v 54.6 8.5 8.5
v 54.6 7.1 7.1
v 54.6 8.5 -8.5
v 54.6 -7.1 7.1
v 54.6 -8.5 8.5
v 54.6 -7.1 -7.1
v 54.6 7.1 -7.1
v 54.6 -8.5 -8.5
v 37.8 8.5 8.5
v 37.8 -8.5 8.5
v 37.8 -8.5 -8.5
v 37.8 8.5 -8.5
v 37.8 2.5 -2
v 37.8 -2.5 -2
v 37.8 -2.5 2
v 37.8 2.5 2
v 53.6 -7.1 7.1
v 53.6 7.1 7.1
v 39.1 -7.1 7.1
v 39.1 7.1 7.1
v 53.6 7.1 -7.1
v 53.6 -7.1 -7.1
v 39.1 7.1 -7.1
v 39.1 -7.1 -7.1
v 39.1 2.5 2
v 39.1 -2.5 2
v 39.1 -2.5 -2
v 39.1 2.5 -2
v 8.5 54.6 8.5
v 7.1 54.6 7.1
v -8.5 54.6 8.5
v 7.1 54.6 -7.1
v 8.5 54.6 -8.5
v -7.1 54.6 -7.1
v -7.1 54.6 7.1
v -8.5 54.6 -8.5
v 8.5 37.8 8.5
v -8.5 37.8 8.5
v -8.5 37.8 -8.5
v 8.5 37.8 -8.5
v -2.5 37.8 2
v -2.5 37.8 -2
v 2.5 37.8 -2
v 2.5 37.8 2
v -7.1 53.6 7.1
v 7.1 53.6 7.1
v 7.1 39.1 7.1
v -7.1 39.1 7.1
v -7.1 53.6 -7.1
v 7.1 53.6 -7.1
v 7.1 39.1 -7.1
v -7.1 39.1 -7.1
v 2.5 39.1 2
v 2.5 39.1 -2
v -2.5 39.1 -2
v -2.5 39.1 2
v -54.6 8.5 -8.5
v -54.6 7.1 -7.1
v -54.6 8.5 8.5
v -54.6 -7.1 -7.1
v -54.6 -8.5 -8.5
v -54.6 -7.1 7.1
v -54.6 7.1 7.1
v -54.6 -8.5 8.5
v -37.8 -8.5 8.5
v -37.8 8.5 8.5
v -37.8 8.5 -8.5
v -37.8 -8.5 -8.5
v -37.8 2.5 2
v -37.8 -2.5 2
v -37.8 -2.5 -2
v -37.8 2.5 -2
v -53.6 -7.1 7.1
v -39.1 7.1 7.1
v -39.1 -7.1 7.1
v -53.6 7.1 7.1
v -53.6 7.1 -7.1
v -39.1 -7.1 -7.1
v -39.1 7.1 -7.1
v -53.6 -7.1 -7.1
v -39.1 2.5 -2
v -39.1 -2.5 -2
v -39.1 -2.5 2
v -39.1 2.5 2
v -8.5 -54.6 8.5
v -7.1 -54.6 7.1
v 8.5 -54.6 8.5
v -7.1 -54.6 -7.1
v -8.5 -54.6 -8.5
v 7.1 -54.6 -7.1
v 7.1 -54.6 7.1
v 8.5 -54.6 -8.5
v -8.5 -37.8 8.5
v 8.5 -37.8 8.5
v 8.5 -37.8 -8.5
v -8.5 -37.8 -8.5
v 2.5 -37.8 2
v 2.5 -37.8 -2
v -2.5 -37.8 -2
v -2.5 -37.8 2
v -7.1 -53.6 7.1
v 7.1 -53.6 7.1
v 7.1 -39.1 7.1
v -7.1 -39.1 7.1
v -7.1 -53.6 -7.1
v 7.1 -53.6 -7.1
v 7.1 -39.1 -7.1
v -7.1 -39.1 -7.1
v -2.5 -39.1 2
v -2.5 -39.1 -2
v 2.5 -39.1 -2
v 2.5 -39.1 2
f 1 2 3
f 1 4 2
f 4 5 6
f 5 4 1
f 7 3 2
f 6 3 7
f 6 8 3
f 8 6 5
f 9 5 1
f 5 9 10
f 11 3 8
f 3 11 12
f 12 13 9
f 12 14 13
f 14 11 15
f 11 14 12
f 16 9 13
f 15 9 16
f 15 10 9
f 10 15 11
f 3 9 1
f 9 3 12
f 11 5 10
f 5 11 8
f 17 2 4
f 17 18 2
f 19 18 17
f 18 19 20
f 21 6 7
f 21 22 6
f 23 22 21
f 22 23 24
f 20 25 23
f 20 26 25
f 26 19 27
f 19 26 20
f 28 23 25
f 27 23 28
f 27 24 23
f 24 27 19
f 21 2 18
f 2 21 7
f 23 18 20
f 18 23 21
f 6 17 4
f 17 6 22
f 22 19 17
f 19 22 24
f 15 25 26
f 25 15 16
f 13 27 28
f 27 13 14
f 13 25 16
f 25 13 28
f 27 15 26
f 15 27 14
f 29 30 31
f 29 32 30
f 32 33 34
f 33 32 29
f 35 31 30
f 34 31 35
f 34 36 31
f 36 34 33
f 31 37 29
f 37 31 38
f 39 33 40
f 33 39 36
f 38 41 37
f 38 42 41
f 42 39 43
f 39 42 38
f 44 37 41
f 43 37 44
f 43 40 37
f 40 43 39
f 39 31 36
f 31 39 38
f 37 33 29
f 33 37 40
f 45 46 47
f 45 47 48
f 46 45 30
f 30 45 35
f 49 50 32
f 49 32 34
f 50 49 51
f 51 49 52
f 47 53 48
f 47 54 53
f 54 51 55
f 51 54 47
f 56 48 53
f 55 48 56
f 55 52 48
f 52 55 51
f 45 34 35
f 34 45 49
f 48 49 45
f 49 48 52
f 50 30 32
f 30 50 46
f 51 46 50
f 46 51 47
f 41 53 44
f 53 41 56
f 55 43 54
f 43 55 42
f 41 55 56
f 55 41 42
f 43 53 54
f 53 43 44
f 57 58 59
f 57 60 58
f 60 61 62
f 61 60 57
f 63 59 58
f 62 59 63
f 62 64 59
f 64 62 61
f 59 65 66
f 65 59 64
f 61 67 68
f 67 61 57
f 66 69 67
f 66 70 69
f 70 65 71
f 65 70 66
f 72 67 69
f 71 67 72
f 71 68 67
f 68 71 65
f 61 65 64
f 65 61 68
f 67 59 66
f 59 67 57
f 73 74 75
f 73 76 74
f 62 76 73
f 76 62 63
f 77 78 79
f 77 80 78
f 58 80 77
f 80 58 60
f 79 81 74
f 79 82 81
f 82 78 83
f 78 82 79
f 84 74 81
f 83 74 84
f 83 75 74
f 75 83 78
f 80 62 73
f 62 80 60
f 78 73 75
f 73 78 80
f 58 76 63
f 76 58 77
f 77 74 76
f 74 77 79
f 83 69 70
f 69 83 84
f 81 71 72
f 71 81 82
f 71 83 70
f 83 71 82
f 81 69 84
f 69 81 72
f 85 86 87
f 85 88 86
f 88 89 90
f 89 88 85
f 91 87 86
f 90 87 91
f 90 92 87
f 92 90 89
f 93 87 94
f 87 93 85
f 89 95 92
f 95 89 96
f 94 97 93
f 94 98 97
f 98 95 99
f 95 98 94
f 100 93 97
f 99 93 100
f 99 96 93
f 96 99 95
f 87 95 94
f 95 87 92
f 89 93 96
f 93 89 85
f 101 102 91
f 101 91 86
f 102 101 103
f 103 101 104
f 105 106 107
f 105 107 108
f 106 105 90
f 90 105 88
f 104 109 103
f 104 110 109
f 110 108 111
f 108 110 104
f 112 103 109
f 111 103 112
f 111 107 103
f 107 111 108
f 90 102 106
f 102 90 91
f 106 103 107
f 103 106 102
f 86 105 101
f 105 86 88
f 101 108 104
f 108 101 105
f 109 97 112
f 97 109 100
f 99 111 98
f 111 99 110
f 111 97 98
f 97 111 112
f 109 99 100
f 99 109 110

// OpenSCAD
// file: 02_materials_tolerances.scad
/*
================================================================
AIDRONE - FILE 02 / 24
MATERIALS + MANUFACTURING + TOLERANCE AUTHORITY

This file intentionally does NOT redefine CAMERA_BODY_* or
CAMERA_POCKET_* from 00_master_parameters.scad. OpenSCAD uses a
single variable namespace across include() expansion; the previous
duplicate names caused the CAMERA_SIDE_CLEARANCE evaluation warnings.
================================================================
*/
$fn=100;

PROCESS_FDM=1;
MANUFACTURING_PROCESS=PROCESS_FDM;
NOZZLE_D=0.40;
LAYER_HEIGHT=0.20;
EXTRUSION_WIDTH=0.45;

WALL_LIGHT=3*EXTRUSION_WIDTH;
WALL_STANDARD=4*EXTRUSION_WIDTH;
WALL_STRUCTURAL=5*EXTRUSION_WIDTH;
WALL_HEAVY=6*EXTRUSION_WIDTH;
DUCT_WALL_NOMINAL=2.00;
MIN_CRASH_MEMBER=2.00;
PREFERRED_CRASH_MEMBER=2.40;
MIN_PRINT_FEATURE=0.80;

CLEARANCE_CLOSE=0.10;
CLEARANCE_REMOVABLE=0.15;
CLEARANCE_SLIDING=0.20;
CLEARANCE_MOVING=0.35;
CLEARANCE_SERVICE=0.40;

function female_bore_for_male(male_diameter,radial_clearance)=male_diameter+2*radial_clearance;
function male_for_female_bore(female_diameter,radial_clearance)=female_diameter-2*radial_clearance;
function pocket_dimension(part_dimension,side_clearance)=part_dimension+2*side_clearance;

CORE_OD=74.0;
CORE_COLLAR_RADIAL_CLEARANCE=CLEARANCE_SLIDING;
COLLAR_BORE=female_bore_for_male(CORE_OD,CORE_COLLAR_RADIAL_CLEARANCE);

// Manufacturing fit policy for camera cavities.  Names are prefixed TOL_
// so they cannot collide with the geometry authority in File 00.
TOL_CAMERA_BODY_X=14.0;
TOL_CAMERA_BODY_Y=14.0;
TOL_CAMERA_BODY_Z=14.0;
TOL_CAMERA_SIDE_CLEARANCE=0.15;
TOL_CAMERA_POCKET_X=TOL_CAMERA_BODY_X+2*TOL_CAMERA_SIDE_CLEARANCE;
TOL_CAMERA_POCKET_Y=TOL_CAMERA_BODY_Y+2*TOL_CAMERA_SIDE_CLEARANCE;
TOL_CAMERA_POCKET_Z=TOL_CAMERA_BODY_Z+2*TOL_CAMERA_SIDE_CLEARANCE;

KEY_SIDE_CLEARANCE=CLEARANCE_SLIDING;
function keyway_width(key_width)=key_width+2*KEY_SIDE_CLEARANCE;
function keyway_depth(key_projection)=key_projection+CLEARANCE_SLIDING;
PIVOT_RADIAL_CLEARANCE=CLEARANCE_MOVING;
function pivot_bore(shaft_diameter)=shaft_diameter+2*PIVOT_RADIAL_CLEARANCE;
METAL_PIN_RADIAL_CLEARANCE=0.10;
function metal_pin_bore(pin_diameter)=pin_diameter+2*METAL_PIN_RADIAL_CLEARANCE;

M1_6_NOMINAL=1.60; M2_NOMINAL=2.00; M2_5_NOMINAL=2.50;
M1_6_CLEARANCE_HOLE=1.90; M2_CLEARANCE_HOLE=2.40; M2_5_CLEARANCE_HOLE=2.90;
SCREW_EDGE_FACTOR=2.0;
function minimum_screw_edge_distance(screw_nominal_d)=screw_nominal_d*SCREW_EDGE_FACTOR;
BOSS_WALL_MIN=1.60;
function boss_outer_diameter(hole_diameter)=hole_diameter+2*BOSS_WALL_MIN;

INSERT_SELECTED=false; INSERT_OD=0; INSERT_LENGTH=0; INSERT_HOLE_D=0;
MIN_STRUCTURAL_FILLET=1.0; PREFERRED_STRUCTURAL_FILLET=1.5;
WIRE_CHANNEL_SIDE_CLEARANCE=0.50;
function wire_channel_width(wire_bundle_width)=wire_bundle_width+2*WIRE_CHANNEL_SIDE_CLEARANCE;
WIRE_MIN_BEND_RADIUS_FACTOR=3.0;
function wire_min_bend_radius(cable_diameter)=cable_diameter*WIRE_MIN_BEND_RADIUS_FACTOR;
BATTERY_SIDE_CLEARANCE=0.50;
function battery_pocket_dimension(battery_dimension)=battery_dimension+2*BATTERY_SIDE_CLEARANCE;
BATTERY_MIN_PADDING=1.0;
MOTOR_SUPPORT_MIN_THICKNESS=2.40;
MOTOR_SUPPORT_PREFERRED_THICKNESS=3.00;
MIN_ROTOR_STATIC_RADIAL_CLEARANCE=1.00;
VANE_SWEEP_MIN_CLEARANCE=1.00;
CAMERA_FOV_MARGIN_DEG=3.0;

XY_EXTERNAL_COMPENSATION=0.00;
XY_INTERNAL_COMPENSATION=0.00;
Z_COMPENSATION=0.00;
function compensated_external(dimension)=dimension+XY_EXTERNAL_COMPENSATION;
function compensated_internal(dimension)=dimension+XY_INTERNAL_COMPENSATION;

assert(NOZZLE_D>0,"Nozzle diameter must be positive.");
assert(WALL_STANDARD>=3*NOZZLE_D,"Standard wall unexpectedly thin.");
assert(MIN_CRASH_MEMBER>=2.0,"Crash member below structural study minimum.");
assert(CLEARANCE_MOVING>CLEARANCE_SLIDING,"Moving fit must be looser than sliding fit.");
assert(CLEARANCE_SLIDING>CLEARANCE_CLOSE,"Sliding fit must be looser than close fit.");
assert(abs(COLLAR_BORE-74.4)<0.0001,"Core/collar interface changed unexpectedly.");
assert(abs(TOL_CAMERA_POCKET_X-14.3)<0.0001 && abs(TOL_CAMERA_POCKET_Y-14.3)<0.0001 && abs(TOL_CAMERA_POCKET_Z-14.3)<0.0001,"Camera manufacturing pocket policy changed unexpectedly.");
assert(MIN_ROTOR_STATIC_RADIAL_CLEARANCE>=1.0,"Rotor manufacturing clearance below current safety floor.");

echo("============================================");
echo("AIDRONE MATERIAL / TOLERANCE AUTHORITY");
echo("Nozzle diameter =",NOZZLE_D);
echo("Layer height =",LAYER_HEIGHT);
echo("Light wall =",WALL_LIGHT);
echo("Standard wall =",WALL_STANDARD);
echo("Structural wall =",WALL_STRUCTURAL);
echo("Preferred crash member =",PREFERRED_CRASH_MEMBER);
echo("Sliding radial clearance =",CLEARANCE_SLIDING);
echo("Core OD =",CORE_OD);
echo("Collar bore =",COLLAR_BORE);
echo("Tolerance camera pocket X =",TOL_CAMERA_POCKET_X);
echo("Tolerance camera pocket Y =",TOL_CAMERA_POCKET_Y);
echo("Tolerance camera pocket Z =",TOL_CAMERA_POCKET_Z);
echo("M2 printed clearance hole =",M2_CLEARANCE_HOLE);
echo("Minimum motor support thickness =",MOTOR_SUPPORT_MIN_THICKNESS);
echo("Minimum rotor radial clearance =",MIN_ROTOR_STATIC_RADIAL_CLEARANCE);
echo("============================================");
// main file
/* BUDDY FILE 20 - FOUR-CAMERA PERCEPTION RING */
include <00_master_parameters.scad>
include <02_materials_tolerances.scad>
$fn=100;
VEHICLE_D=115; VEHICLE_R=57.5; SHELL_INNER_D=111; SHELL_INNER_R=55.5;
DUCT_OD_LOCAL=74; DUCT_R=37; AIRWAY_D=70; AIRWAY_R=35;
CAMERA_COUNT_LOCAL=4; CAMERA_ANGLE_OFFSET=0;
CAMERA_BODY_W=14; CAMERA_BODY_H=14; CAMERA_BODY_D=15;
CAMERA_POCKET_W=14.2; CAMERA_POCKET_H=14.2; CAMERA_DEPTH_CLEARANCE=0.4;
CAMERA_POCKET_D=CAMERA_BODY_D+CAMERA_DEPTH_CLEARANCE;
CAMERA_WALL=1.4; HOUSING_W=CAMERA_POCKET_W+2*CAMERA_WALL; HOUSING_H=CAMERA_POCKET_H+2*CAMERA_WALL; HOUSING_D=CAMERA_POCKET_D+CAMERA_WALL;
// 0.8 mm from duct OD preserves service clearance and gains shell margin.
CAMERA_DUCT_GAP=0.8; HOUSING_INNER_R=DUCT_R+CAMERA_DUCT_GAP; HOUSING_CENTER_R=HOUSING_INNER_R+HOUSING_D/2; HOUSING_OUTER_R=HOUSING_INNER_R+HOUSING_D; CAMERA_Z=0;
LENS_APERTURE_D=8; LENS_CLEARANCE=0.5; LENS_OPENING_D=LENS_APERTURE_D+2*LENS_CLEARANCE; LENS_PLANE_R=HOUSING_OUTER_R;
HORIZONTAL_FOV_DEG=120; VERTICAL_FOV_DEG=100; FOV_LENGTH=35; FOV_END_HALF_WIDTH=FOV_LENGTH*tan(HORIZONTAL_FOV_DEG/2); FOV_END_HALF_HEIGHT=FOV_LENGTH*tan(VERTICAL_FOV_DEG/2);
RETAINER_LIP=0.8; RETAINER_DEPTH=1; CABLE_EXIT_W=5; CABLE_EXIT_H=4;
SHOW_HOUSINGS=true; SHOW_CAMERAS=true; SHOW_FOV=false; SHOW_DUCT=false; SHOW_AIRWAY=false; SHOW_SHELL_INNER=false; SHOW_OUTER_SPHERE=false;
camera_ring();
module camera_ring(){ if(SHOW_HOUSINGS) for(i=[0:CAMERA_COUNT_LOCAL-1]) camera_housing_at_station(i); if(SHOW_CAMERAS) for(i=[0:CAMERA_COUNT_LOCAL-1]) %camera_envelope_at_station(i); if(SHOW_FOV) for(i=[0:CAMERA_COUNT_LOCAL-1]) %camera_fov_at_station(i); if(SHOW_DUCT) %duct_reference(); if(SHOW_AIRWAY) %airway_reference(); if(SHOW_SHELL_INNER) %sphere(d=SHELL_INNER_D); if(SHOW_OUTER_SPHERE) %sphere(d=VEHICLE_D); }
module camera_housing(){ difference(){ camera_housing_outer(); camera_pocket(); lens_opening(); cable_exit(); } camera_retention_lips(); }
module camera_housing_outer(){ translate([HOUSING_CENTER_R,0,CAMERA_Z]) cube([HOUSING_D,HOUSING_W,HOUSING_H],center=true); }
module camera_pocket(){ translate([HOUSING_INNER_R+CAMERA_WALL+CAMERA_POCKET_D/2,0,CAMERA_Z]) cube([CAMERA_POCKET_D+0.2,CAMERA_POCKET_W,CAMERA_POCKET_H],center=true); }
module lens_opening(){ translate([HOUSING_OUTER_R,0,CAMERA_Z]) rotate([0,90,0]) cylinder(h=2*CAMERA_WALL+1,d=LENS_OPENING_D,center=true); }
module cable_exit(){ translate([HOUSING_INNER_R,0,CAMERA_Z]) cube([2*CAMERA_WALL+1,CABLE_EXIT_W,CABLE_EXIT_H],center=true); }
module camera_retention_lips(){ for(side=[-1,1]) translate([HOUSING_OUTER_R-RETAINER_DEPTH/2,side*(CAMERA_POCKET_W/2+RETAINER_LIP/2),CAMERA_Z]) cube([RETAINER_DEPTH,RETAINER_LIP,CAMERA_POCKET_H],center=true); }
module camera_housing_at_station(station){ rotate([0,0,CAMERA_ANGLE_OFFSET+station*360/CAMERA_COUNT_LOCAL]) camera_housing(); }
module camera_envelope(){ translate([HOUSING_INNER_R+CAMERA_WALL+CAMERA_BODY_D/2,0,CAMERA_Z]) cube([CAMERA_BODY_D,CAMERA_BODY_W,CAMERA_BODY_H],center=true); }
module camera_envelope_at_station(station){ rotate([0,0,CAMERA_ANGLE_OFFSET+station*360/CAMERA_COUNT_LOCAL]) camera_envelope(); }
module camera_fov(){ hull(){ translate([LENS_PLANE_R,0,CAMERA_Z]) cube([0.1,LENS_OPENING_D,LENS_OPENING_D],center=true); translate([LENS_PLANE_R+FOV_LENGTH,0,CAMERA_Z]) cube([0.1,2*FOV_END_HALF_WIDTH,2*FOV_END_HALF_HEIGHT],center=true); } }
module camera_fov_at_station(station){ rotate([0,0,CAMERA_ANGLE_OFFSET+station*360/CAMERA_COUNT_LOCAL]) camera_fov(); }
module duct_reference(){ difference(){ cylinder(h=70,d=DUCT_OD_LOCAL,center=true); cylinder(h=70.2,d=AIRWAY_D,center=true); } }
module airway_reference(){ cylinder(h=70,d=AIRWAY_D,center=true); }
function sphere_radius_at_z(r,z)=abs(z)<=r?sqrt(r*r-z*z):0;
CAMERA_WORST_Z=max(abs(CAMERA_Z+HOUSING_H/2),abs(CAMERA_Z-HOUSING_H/2));
AVAILABLE_SHELL_R=sphere_radius_at_z(SHELL_INNER_R,CAMERA_WORST_Z);
CAMERA_SHELL_CLEARANCE=AVAILABLE_SHELL_R-HOUSING_OUTER_R;
CAMERA_AIRWAY_CLEARANCE=HOUSING_INNER_R-AIRWAY_R;
CAMERA_DUCT_CLEARANCE=HOUSING_INNER_R-DUCT_R;
CAMERA_SPACING_DEG=360/CAMERA_COUNT_LOCAL; HORIZONTAL_FOV_OVERLAP=HORIZONTAL_FOV_DEG-CAMERA_SPACING_DEG;
assert(CAMERA_COUNT_LOCAL==4,"FAIL: camera architecture requires four stations.");
assert(CAMERA_POCKET_W>=14.2 && CAMERA_POCKET_H>=14.2,"FAIL: camera pocket below 14.2 mm requirement.");
assert(CAMERA_DUCT_CLEARANCE>=0.2,"FAIL: camera housing too close to duct OD.");
assert(CAMERA_AIRWAY_CLEARANCE>0,"FAIL: camera structure enters propulsion airway.");
assert(HOUSING_OUTER_R<VEHICLE_R,"FAIL: camera housing exits vehicle envelope.");
assert(CAMERA_SHELL_CLEARANCE>=0.2,"FAIL: camera housing lacks 0.2 mm inner-shell clearance.");
assert(HORIZONTAL_FOV_OVERLAP>=0,"FAIL: four-camera horizontal coverage contains blind sectors.");
echo("============================================"); echo("BUDDY FILE 20 - CAMERA RING"); echo("Housing outer radius mm =",HOUSING_OUTER_R); echo("Worst housing |Z| mm =",CAMERA_WORST_Z); echo("Available shell radius mm =",AVAILABLE_SHELL_R); echo("Camera/shell clearance mm =",CAMERA_SHELL_CLEARANCE); echo("Camera/duct clearance mm =",CAMERA_DUCT_CLEARANCE); echo("Camera/airway clearance mm =",CAMERA_AIRWAY_CLEARANCE); echo("Adjacent horizontal FOV overlap deg =",HORIZONTAL_FOV_OVERLAP); echo("============================================");
